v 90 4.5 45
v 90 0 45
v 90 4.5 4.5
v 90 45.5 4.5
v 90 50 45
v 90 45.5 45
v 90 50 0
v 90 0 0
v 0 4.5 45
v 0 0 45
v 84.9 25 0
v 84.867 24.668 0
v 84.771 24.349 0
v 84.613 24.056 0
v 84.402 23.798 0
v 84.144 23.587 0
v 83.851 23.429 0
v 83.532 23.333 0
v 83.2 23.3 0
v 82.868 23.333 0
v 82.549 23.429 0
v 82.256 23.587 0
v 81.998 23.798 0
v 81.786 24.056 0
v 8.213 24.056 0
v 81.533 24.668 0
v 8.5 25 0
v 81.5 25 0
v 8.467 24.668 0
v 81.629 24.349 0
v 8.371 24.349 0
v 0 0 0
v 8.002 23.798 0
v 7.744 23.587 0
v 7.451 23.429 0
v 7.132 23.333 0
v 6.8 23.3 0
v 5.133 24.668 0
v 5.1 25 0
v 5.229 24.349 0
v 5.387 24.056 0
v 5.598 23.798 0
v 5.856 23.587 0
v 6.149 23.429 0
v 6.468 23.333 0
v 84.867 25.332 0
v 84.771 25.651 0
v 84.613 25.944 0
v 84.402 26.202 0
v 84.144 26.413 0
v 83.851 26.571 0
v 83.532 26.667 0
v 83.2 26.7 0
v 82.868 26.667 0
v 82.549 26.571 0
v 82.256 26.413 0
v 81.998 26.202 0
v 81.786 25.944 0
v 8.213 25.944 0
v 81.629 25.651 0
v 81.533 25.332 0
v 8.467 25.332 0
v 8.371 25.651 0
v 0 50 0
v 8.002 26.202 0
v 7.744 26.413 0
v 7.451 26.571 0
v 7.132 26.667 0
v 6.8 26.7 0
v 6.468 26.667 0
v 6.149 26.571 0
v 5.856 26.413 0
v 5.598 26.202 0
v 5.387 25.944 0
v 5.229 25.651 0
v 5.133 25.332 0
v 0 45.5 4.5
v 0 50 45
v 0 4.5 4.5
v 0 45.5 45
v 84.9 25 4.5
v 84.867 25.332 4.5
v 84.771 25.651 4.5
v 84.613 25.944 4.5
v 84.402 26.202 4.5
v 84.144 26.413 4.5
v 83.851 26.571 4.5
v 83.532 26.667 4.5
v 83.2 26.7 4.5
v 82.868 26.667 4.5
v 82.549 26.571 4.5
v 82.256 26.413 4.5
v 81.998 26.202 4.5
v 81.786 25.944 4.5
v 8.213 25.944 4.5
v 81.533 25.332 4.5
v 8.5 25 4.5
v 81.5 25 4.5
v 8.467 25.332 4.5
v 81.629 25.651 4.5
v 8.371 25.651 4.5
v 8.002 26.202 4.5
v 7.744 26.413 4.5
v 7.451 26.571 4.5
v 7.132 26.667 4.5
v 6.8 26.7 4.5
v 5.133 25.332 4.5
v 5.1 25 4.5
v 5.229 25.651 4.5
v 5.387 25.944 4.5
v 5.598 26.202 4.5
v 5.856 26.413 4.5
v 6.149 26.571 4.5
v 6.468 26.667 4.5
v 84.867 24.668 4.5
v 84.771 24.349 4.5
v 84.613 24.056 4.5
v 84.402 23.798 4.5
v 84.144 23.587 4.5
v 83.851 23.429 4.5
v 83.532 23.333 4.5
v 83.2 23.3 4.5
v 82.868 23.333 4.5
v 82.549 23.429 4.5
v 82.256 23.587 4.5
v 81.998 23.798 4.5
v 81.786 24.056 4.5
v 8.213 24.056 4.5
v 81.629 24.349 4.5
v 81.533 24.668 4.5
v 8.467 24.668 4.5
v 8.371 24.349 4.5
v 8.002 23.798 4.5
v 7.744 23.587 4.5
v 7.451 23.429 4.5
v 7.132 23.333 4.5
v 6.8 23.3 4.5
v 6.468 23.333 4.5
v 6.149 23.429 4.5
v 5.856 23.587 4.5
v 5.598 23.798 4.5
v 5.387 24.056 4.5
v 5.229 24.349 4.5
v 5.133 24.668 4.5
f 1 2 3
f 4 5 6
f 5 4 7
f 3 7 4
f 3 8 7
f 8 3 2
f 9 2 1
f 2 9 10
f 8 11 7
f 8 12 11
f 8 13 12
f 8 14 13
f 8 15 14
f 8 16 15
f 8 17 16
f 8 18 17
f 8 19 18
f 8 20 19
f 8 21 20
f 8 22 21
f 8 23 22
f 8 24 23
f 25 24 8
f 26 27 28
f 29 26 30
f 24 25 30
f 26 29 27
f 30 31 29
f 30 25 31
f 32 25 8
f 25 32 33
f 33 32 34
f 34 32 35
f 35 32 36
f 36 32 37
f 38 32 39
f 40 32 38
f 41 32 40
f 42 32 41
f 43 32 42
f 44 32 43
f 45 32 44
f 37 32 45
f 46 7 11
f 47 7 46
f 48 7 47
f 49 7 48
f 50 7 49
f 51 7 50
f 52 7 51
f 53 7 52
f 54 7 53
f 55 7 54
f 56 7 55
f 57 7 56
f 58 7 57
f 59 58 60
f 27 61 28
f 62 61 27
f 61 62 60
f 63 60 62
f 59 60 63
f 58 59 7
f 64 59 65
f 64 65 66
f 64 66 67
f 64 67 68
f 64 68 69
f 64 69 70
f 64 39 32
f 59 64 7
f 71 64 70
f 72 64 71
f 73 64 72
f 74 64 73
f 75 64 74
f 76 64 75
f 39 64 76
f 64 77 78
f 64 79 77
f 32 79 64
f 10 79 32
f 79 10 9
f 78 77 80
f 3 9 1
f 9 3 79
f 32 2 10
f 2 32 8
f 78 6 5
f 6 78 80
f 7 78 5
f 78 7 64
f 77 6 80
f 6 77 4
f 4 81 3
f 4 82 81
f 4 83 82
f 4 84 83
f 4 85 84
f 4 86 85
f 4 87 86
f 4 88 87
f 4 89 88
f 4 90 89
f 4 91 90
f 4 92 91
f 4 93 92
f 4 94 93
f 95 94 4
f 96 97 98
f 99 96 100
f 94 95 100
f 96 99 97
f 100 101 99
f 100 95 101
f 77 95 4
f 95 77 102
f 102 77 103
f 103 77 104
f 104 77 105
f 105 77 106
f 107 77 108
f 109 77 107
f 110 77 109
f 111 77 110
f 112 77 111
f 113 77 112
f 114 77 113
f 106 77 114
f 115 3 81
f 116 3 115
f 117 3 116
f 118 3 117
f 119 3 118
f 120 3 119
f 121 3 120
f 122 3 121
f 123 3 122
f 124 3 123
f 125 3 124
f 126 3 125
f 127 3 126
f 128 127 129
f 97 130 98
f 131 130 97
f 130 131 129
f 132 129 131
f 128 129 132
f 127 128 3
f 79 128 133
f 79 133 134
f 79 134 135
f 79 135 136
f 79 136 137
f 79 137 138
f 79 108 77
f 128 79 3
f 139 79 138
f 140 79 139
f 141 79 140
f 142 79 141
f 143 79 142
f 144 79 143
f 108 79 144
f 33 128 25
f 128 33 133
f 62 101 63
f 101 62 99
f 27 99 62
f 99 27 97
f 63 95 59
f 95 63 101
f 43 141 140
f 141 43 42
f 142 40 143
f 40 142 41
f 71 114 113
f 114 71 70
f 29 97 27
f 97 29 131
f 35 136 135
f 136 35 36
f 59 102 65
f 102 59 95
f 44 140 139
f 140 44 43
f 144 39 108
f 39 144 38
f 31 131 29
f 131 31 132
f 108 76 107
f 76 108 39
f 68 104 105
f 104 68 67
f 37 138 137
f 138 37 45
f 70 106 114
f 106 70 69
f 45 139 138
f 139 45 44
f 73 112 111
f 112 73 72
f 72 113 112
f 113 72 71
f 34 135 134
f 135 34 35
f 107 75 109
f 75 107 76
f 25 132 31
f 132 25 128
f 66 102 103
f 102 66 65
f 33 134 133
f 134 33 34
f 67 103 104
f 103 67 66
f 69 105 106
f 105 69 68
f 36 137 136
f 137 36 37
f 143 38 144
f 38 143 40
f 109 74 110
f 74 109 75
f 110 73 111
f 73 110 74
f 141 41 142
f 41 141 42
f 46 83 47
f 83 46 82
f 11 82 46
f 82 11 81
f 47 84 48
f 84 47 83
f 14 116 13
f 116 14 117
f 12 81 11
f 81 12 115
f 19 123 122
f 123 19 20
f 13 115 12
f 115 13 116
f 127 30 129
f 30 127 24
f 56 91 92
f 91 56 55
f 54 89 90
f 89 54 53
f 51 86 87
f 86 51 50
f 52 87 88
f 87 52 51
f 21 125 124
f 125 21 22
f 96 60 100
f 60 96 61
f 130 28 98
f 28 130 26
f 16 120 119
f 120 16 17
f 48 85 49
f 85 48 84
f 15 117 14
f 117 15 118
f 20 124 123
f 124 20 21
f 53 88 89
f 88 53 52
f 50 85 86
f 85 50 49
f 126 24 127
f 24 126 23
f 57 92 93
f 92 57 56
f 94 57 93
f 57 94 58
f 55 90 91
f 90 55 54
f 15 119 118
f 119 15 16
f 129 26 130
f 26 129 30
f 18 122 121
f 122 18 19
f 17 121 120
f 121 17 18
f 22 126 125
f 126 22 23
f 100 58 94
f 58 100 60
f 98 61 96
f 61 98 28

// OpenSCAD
$fn = 32;

// ----------------------------------------------------------------------
// U-bracket: 90 x 50 x 45 mm
// ----------------------------------------------------------------------

// --- parameters (mm) ---
base_len = 90;            // outer length, X
channel_w = 50;           // outer width, Y
upright_h = 45;           // upright height, Z
mat_t = 4.5;              // wall thickness
hole_d = 3.4;             // clearance for M3

module hole_z(px, py) {
  translate([px, py, -2.5]) cylinder(h = mat_t + 5, d = hole_d);
}
module hole_y_pz(pz) {
  /* through both uprights along Y */
  translate([0, -2.5, pz]) rotate([-90, 0, 0]) cylinder(h = channel_w + 5, d = hole_d);
}

module base() {
  cube([base_len, channel_w, mat_t]);
}

module uprights() {
  cube([base_len, mat_t, upright_h]);
  translate([0, channel_w - mat_t, 0]) cube([base_len, mat_t, upright_h]);
}

difference() {
  union() {
    base();
    uprights();
  }
  hole_z(6.8, 25);
  hole_z(83.2, 25);
}
